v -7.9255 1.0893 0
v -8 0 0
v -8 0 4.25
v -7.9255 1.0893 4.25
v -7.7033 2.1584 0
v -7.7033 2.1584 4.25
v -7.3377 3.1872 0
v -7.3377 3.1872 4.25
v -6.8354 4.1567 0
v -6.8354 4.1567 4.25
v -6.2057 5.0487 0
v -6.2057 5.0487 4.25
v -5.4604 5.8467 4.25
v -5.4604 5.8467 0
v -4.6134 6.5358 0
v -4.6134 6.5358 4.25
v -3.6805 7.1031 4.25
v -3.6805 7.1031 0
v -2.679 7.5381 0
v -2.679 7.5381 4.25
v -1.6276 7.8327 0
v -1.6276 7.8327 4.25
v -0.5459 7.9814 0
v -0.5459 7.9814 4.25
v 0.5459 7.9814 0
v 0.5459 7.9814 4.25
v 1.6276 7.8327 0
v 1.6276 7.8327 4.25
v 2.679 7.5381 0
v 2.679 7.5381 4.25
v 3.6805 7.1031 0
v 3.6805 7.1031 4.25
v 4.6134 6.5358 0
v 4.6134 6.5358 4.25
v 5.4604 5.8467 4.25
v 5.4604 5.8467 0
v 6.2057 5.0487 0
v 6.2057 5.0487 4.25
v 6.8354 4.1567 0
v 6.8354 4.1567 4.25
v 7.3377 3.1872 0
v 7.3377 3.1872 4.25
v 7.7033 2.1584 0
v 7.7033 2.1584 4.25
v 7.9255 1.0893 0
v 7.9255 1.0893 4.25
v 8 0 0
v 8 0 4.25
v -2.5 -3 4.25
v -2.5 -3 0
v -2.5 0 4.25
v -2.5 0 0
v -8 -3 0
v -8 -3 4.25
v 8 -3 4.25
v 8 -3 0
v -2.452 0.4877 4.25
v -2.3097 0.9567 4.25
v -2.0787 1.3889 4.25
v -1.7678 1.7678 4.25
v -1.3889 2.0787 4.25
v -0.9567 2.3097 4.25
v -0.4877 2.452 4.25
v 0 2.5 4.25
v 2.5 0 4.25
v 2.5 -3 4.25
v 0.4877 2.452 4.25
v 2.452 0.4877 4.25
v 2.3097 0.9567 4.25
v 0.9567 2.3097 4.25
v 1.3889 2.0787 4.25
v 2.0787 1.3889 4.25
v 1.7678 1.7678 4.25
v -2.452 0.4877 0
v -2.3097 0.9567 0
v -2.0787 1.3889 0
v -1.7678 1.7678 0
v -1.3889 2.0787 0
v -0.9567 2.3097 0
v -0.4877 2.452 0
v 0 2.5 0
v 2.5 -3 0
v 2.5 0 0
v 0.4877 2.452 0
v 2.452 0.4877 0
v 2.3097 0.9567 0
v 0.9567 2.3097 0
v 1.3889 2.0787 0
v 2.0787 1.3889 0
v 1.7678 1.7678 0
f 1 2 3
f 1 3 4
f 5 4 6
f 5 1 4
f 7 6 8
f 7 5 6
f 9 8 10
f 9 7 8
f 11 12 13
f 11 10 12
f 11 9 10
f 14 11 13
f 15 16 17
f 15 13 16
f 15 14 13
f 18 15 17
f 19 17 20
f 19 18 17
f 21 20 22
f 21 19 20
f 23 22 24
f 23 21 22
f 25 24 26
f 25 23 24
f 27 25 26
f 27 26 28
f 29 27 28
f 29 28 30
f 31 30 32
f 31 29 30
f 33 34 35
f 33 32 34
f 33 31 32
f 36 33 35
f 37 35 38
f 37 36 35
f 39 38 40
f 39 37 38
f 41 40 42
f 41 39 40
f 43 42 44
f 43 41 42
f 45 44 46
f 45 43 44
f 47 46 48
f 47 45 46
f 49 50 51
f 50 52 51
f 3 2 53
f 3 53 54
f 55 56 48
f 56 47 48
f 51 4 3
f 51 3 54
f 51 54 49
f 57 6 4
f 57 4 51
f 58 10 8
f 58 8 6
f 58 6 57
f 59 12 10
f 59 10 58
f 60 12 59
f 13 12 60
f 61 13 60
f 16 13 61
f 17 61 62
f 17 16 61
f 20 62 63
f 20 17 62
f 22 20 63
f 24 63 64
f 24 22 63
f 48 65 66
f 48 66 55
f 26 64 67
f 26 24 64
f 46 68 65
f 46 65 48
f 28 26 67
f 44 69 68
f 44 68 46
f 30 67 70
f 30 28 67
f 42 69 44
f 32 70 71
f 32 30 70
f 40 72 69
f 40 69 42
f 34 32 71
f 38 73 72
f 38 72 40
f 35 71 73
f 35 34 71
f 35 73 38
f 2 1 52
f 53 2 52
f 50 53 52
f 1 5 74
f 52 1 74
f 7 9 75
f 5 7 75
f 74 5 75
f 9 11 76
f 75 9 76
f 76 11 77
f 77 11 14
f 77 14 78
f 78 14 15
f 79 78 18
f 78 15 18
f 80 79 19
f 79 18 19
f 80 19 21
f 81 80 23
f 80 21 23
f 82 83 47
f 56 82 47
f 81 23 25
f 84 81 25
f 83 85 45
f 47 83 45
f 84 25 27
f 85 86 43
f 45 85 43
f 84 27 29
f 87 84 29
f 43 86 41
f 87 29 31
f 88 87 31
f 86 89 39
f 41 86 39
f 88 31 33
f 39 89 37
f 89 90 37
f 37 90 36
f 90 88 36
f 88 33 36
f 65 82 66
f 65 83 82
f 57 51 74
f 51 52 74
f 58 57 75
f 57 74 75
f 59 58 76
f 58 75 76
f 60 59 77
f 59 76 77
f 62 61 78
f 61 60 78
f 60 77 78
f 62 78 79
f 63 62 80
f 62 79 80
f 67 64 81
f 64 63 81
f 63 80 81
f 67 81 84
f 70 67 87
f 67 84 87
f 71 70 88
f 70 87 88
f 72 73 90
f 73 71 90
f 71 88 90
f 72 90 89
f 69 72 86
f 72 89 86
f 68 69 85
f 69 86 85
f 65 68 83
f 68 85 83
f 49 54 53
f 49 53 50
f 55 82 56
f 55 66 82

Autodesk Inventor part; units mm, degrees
ref_plane "YZ Plane" through (0, 0, 0) normal (1, 0, 0) x (0, 1, 0)
ref_plane "XZ Plane" through (0, 0, 0) normal (0, 1, 0) x (-1, 0, 0)
ref_plane "XY Plane" through (0, 0, 0) normal (0, 0, 1) x (1, 0, 0)
sketch "Sketch1" plane through (0, 0, 0) normal (0, 0, 1) x (1, 0, 0)
  circle A0 centre (0, 0) radius 2.5
  circle A1 centre (0, 0) radius 8
  line L0 (-8, 0) -> (8, 0)
  point P0 (-2.5, 0)
  point P1 (2.5, 0)
  dimension "d0" = 16
  dimension "d1" = 5
extrude "Extrusion1" add sketch "Sketch1" along normal blind 4.25 contours A0 L0 A1 picked at (-6.065, 0.8376)
sketch "Sketch2" plane through (-8, 0, 0) normal (0, -1, 0) x (1, 0, 0)
  line L0 (0, 0) -> (5.5, 0) projected
  line L1 (5.5, 0) -> (5.5, 4.25) projected
  line L2 (0, 4.25) -> (5.5, 4.25) projected
  line L3 (0, 0) -> (0, 4.25) projected
  line L4 (10.5, 0) -> (16, 0) projected
  line L5 (16, 0) -> (16, 4.25) projected
  line L6 (10.5, 4.25) -> (16, 4.25) projected
  line L7 (10.5, 0) -> (10.5, 4.25) projected
  point P0 (8, 0)
extrude "Extrusion2" add sketch "Sketch2" along normal blind 3
properties part number "Riemenscheibe_Adjustment_Disk"
